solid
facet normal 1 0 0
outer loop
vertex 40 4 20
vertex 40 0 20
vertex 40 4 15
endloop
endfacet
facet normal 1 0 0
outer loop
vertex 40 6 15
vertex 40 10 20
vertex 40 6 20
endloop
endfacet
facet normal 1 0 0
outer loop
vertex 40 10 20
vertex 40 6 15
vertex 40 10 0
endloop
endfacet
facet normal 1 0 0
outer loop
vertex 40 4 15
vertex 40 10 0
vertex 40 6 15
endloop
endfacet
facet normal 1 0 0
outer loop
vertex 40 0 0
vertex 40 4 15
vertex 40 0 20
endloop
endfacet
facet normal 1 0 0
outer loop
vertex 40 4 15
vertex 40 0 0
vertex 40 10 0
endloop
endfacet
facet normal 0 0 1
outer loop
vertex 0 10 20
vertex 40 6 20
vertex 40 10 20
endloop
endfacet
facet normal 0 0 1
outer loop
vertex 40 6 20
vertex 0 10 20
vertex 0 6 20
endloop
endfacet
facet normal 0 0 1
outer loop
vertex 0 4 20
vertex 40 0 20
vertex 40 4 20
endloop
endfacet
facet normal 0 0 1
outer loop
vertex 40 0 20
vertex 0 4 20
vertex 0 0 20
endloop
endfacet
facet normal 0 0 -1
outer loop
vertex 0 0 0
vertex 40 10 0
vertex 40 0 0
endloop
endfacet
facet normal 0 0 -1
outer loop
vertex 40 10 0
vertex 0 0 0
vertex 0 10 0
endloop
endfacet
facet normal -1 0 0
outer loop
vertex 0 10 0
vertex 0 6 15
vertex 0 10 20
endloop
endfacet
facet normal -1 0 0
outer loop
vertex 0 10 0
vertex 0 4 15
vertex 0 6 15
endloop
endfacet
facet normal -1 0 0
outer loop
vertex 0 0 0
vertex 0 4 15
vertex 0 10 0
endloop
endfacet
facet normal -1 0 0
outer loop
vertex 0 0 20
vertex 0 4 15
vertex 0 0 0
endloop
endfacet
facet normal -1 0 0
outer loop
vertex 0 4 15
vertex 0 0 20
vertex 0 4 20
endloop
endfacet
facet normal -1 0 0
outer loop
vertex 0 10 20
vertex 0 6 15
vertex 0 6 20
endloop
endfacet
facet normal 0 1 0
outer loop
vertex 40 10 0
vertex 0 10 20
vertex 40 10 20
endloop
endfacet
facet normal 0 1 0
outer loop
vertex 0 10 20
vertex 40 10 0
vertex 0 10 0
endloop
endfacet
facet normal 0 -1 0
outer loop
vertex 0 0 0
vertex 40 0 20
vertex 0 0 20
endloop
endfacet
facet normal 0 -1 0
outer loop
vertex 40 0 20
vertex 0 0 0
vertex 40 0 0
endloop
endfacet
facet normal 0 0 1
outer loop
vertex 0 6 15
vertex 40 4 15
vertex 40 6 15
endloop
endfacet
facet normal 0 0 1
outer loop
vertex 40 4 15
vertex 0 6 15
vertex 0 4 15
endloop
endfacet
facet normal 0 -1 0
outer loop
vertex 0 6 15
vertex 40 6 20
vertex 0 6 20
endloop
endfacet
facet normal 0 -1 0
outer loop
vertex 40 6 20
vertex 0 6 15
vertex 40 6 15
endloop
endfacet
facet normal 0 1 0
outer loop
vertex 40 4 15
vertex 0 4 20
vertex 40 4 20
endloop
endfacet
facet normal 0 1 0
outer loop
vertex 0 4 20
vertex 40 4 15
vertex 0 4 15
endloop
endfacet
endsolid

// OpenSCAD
length = 40;

width = 10;

height = 20;

recess_dip = 5;

recess_width = 2;

difference(){
cube([length, width, height]);
	translate([0,width/2-recess_width/2,(height-recess_dip)]){
		cube([length, recess_width, recess_dip]);
	}
}
